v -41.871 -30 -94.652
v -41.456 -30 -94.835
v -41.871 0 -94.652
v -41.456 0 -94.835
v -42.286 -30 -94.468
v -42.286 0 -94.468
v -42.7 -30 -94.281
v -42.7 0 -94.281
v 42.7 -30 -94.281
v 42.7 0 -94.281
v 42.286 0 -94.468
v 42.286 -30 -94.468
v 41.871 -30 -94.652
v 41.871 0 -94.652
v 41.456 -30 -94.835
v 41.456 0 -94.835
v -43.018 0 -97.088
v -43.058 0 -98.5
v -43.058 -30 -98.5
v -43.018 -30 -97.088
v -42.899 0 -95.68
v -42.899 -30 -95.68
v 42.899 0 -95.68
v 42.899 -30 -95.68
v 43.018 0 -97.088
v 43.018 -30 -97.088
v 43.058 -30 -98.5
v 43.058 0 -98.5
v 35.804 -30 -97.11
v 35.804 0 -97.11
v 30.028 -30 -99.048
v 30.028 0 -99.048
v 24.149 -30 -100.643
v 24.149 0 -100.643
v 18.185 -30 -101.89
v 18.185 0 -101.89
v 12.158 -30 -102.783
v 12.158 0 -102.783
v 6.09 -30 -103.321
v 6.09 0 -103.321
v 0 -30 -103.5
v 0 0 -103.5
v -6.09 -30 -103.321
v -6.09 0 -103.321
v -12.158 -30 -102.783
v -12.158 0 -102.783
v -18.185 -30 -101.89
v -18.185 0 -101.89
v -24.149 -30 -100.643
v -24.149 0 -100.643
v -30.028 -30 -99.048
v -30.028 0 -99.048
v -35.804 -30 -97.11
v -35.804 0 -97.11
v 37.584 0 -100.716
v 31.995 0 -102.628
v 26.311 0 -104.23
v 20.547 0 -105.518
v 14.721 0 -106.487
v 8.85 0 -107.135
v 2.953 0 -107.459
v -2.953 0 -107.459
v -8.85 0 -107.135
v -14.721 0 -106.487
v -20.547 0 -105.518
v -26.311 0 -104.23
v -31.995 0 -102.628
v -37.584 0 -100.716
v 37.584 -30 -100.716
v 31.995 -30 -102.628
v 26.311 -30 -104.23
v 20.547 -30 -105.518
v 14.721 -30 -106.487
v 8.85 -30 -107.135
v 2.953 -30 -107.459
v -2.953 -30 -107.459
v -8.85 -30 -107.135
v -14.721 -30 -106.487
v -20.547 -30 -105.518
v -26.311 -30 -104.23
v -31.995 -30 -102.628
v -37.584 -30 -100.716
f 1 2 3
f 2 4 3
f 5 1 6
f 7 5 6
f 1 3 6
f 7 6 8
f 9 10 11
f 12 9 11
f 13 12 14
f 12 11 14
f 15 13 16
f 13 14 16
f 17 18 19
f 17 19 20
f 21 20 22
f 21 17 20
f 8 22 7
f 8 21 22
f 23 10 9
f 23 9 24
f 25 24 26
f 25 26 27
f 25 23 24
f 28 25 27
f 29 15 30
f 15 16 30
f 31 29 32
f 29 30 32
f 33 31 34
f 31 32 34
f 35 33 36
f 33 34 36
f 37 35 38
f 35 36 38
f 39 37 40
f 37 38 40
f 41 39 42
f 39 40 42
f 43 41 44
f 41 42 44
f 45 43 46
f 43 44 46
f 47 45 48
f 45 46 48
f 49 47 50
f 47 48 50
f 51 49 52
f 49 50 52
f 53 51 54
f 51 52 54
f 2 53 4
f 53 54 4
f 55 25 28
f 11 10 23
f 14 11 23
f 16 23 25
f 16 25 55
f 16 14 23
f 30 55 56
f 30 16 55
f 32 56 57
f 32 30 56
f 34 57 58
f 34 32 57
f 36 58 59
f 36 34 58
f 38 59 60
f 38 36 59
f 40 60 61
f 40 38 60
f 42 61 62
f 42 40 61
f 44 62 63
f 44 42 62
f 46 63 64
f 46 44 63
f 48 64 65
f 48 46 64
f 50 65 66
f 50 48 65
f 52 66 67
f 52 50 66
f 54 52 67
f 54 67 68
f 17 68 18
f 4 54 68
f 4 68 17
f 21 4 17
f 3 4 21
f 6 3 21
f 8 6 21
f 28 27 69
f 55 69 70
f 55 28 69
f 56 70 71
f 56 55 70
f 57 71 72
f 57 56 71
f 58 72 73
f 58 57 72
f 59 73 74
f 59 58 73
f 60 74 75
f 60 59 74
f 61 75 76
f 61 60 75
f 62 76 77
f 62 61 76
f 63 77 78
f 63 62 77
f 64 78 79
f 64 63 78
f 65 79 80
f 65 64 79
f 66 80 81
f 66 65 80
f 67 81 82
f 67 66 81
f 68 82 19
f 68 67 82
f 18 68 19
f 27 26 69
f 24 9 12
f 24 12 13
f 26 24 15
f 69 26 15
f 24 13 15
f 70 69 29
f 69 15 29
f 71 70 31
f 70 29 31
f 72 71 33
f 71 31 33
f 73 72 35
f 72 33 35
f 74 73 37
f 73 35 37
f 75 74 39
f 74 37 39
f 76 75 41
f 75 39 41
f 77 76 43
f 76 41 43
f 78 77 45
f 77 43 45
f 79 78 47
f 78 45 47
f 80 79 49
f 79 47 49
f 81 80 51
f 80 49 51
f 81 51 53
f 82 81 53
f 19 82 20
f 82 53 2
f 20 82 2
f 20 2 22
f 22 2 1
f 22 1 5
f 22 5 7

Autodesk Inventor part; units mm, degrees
ref_plane "YZ Plane" through (0, 0, 0) normal (1, 0, 0) x (0, 1, 0)
ref_plane "XZ Plane" through (0, 0, 0) normal (0, 1, 0) x (-1, 0, 0)
sketch "Sketch1" plane through (0, 0, 0) normal (0, 1, 0) x (-1, 0, 0)
  circle A0 centre (0, 0) radius 110 construction
  arc A1 (43.0581, -98.5) -> (-43.0581, -98.5) centre (0, 0) ccw
  line L0 (0, -107.5) -> (0, -98.5) construction
  line L1 (0, -98.5) -> (0, -73.5) construction
  line L2 (0, -98.5) -> (-43.0581, -98.5) construction
  line L3 (0, -98.5) -> (43.0581, -98.5) construction
  line L4 (43.0581, -98.5) -> (-43.0581, -98.5) construction
  line L5 (-18.0581, -73.5) -> (18.0581, -73.5)
  arc A2 (43.0581, -98.5) -> (18.0581, -73.5) centre (18.0581, -98.5) ccw
  arc A3 (-18.0581, -73.5) -> (-43.0581, -98.5) centre (-18.0581, -98.5) ccw
  line L6 (0, 107.5) -> (0, 97.5) construction
  line L7 (0, 97.5) -> (-22.5, 97.5) construction
  line L8 (-22.5, 97.5) -> (-22.5, 82.5) construction
  line L9 (22.5, 82.5) -> (22.5, 97.5) construction
  line L10 (22.5, 90) -> (-22.5, 90) construction
  line L11 (15, 97.5) -> (-15, 97.5)
  line L12 (-15, 82.5) -> (15, 82.5)
  arc A4 (15, 82.5) -> (15, 97.5) centre (15, 90) ccw
  arc A5 (-15, 97.5) -> (-15, 82.5) centre (-15, 90) ccw
  line L13 (22.5, 82.5) -> (17.5, 82.5) construction
  line L14 (17.5, 82.5) -> (17.5, 77.5) construction
  circle A6 centre (17.5, 77.5) radius 1.6
  circle A7 centre (-17.5, 77.5) radius 1.6
  line L15 (-58.336309, 79.549513) -> (-79.549513, 58.336309)
  arc A8 (-47.729708, 68.942911) -> (-58.336309, 79.549513) centre (-53.033009, 74.246212) ccw
  arc A9 (-79.549513, 58.336309) -> (-68.942911, 47.729708) centre (-74.246212, 53.033009) ccw
  line L16 (-68.942911, 47.729708) -> (-47.729708, 68.942911)
  circle A10 centre (-67.175144, 42.426407) radius 1.6
  circle A11 centre (-42.426407, 67.175144) radius 1.6
  line L17 (-97.5, 15) -> (-97.5, -15)
  arc A12 (-82.5, 15) -> (-97.5, 15) centre (-90, 15) ccw
  arc A13 (-97.5, -15) -> (-82.5, -15) centre (-90, -15) ccw
  line L18 (-82.5, -15) -> (-82.5, 15)
  circle A14 centre (-77.5, -17.5) radius 1.6
  circle A15 centre (-77.5, 17.5) radius 1.6
  line L19 (-79.549513, -58.336309) -> (-58.336309, -79.549513)
  arc A16 (-68.942911, -47.729708) -> (-79.549513, -58.336309) centre (-74.246212, -53.033009) ccw
  arc A17 (-58.336309, -79.549513) -> (-47.729708, -68.942911) centre (-53.033009, -74.246212) ccw
  line L20 (-47.729708, -68.942911) -> (-68.942911, -47.729708)
  circle A18 centre (-42.426407, -67.175144) radius 1.6
  circle A19 centre (-67.175144, -42.426407) radius 1.6
  line L21 (-15, -97.5) -> (15, -97.5)
  arc A20 (-15, -82.5) -> (-15, -97.5) centre (-15, -90) ccw
  arc A21 (15, -97.5) -> (15, -82.5) centre (15, -90) ccw
  line L22 (15, -82.5) -> (-15, -82.5)
  circle A22 centre (17.5, -77.5) radius 1.6
  circle A23 centre (-17.5, -77.5) radius 1.6
  line L23 (58.336309, -79.549513) -> (79.549513, -58.336309)
  arc A24 (47.729708, -68.942911) -> (58.336309, -79.549513) centre (53.033009, -74.246212) ccw
  arc A25 (79.549513, -58.336309) -> (68.942911, -47.729708) centre (74.246212, -53.033009) ccw
  line L24 (68.942911, -47.729708) -> (47.729708, -68.942911)
  circle A26 centre (67.175144, -42.426407) radius 1.6
  circle A27 centre (42.426407, -67.175144) radius 1.6
  line L25 (97.5, -15) -> (97.5, 15)
  arc A28 (82.5, -15) -> (97.5, -15) centre (90, -15) ccw
  arc A29 (97.5, 15) -> (82.5, 15) centre (90, 15) ccw
  line L26 (82.5, 15) -> (82.5, -15)
  circle A30 centre (77.5, 17.5) radius 1.6
  circle A31 centre (77.5, -17.5) radius 1.6
  line L27 (79.549513, 58.336309) -> (58.336309, 79.549513)
  arc A32 (68.942911, 47.729708) -> (79.549513, 58.336309) centre (74.246212, 53.033009) ccw
  arc A33 (58.336309, 79.549513) -> (47.729708, 68.942911) centre (53.033009, 74.246212) ccw
  line L28 (47.729708, 68.942911) -> (68.942911, 47.729708)
  circle A34 centre (42.426407, 67.175144) radius 1.6
  circle A35 centre (67.175144, 42.426407) radius 1.6
  line L29 (58.336309, -58.336309) -> (51.265242, -51.265242) construction
  line L30 (40.65864, -61.871843) -> (61.871843, -40.65864)
  arc A36 (40.65864, -61.871843) -> (44.52672, -89.539774) centre (53.033009, -74.246212) ccw
  arc A37 (89.539774, -44.52672) -> (61.871843, -40.65864) centre (74.246212, -53.033009) ccw
  line L31 (0, -73.5) -> (0, -66.5) construction
  arc A38 (44.52672, 89.539774) -> (40.65864, 61.871843) centre (53.033009, 74.246212) ccw
  line L32 (61.871843, 40.65864) -> (40.65864, 61.871843)
  arc A39 (61.871843, 40.65864) -> (89.539774, 44.52672) centre (74.246212, 53.033009) ccw
  arc A40 (-89.539774, 44.52672) -> (-61.871843, 40.65864) centre (-74.246212, 53.033009) ccw
  line L33 (-40.65864, 61.871843) -> (-61.871843, 40.65864)
  arc A41 (-40.65864, 61.871843) -> (-44.52672, 89.539774) centre (-53.033009, 74.246212) ccw
  arc A42 (-44.52672, -89.539774) -> (-40.65864, -61.871843) centre (-53.033009, -74.246212) ccw
  line L34 (-61.871843, -40.65864) -> (-40.65864, -61.871843)
  arc A43 (-61.871843, -40.65864) -> (-89.539774, -44.52672) centre (-74.246212, -53.033009) ccw
  arc A44 (89.539774, -44.52672) -> (89.539774, 44.52672) centre (0, 0) ccw
  arc A45 (44.52672, 89.539774) -> (-44.52672, 89.539774) centre (0, 0) ccw
  arc A46 (-89.539774, 44.52672) -> (-89.539774, -44.52672) centre (0, 0) ccw
  line L35 (43.0581, -98.5) -> (48.0581, -98.5) construction
  line L36 (48.0581, -98.5) -> (48.0581, -88.5) construction
  circle A47 centre (48.0581, -88.5) radius 1.6
  circle A48 centre (-48.0581, -88.5) radius 1.6
  line L37 (18.0581, -66.5) -> (-18.0581, -66.5)
  arc A49 (17.5, -66.5) -> (43.0581, -59.472383) centre (19.514525, -23.837671) ccw
  arc A50 (-44.52672, -58.003763) -> (-18.0581, -66.5) centre (-19.508856, -25.542168) ccw
  arc A51 (-48.0581, -88.5) -> (-42.426407, -67.175144) centre (-60.43967, -73.824078) ccw construction
  arc A52 (-48.0581, -88.5) -> (-42.426407, -67.175144) centre (-60.43967, -73.824078) ccw construction
  arc A53 (-44.936716, -92.199789) -> (-37.885276, -65.498953) centre (-60.43967, -73.824078) ccw
  arc A54 (-51.179485, -84.800211) -> (-46.967537, -68.851335) centre (-60.43967, -73.824078) ccw
  arc A55 (-51.179485, -84.800211) -> (-44.936716, -92.199789) centre (-48.0581, -88.5) ccw
  arc A56 (-37.885276, -65.498953) -> (-46.967537, -68.851335) centre (-42.426407, -67.175144) ccw
  line L38 (42.426407, 67.175144) -> (67.175144, 42.426407) construction
  line L39 (45.961941, 70.710678) -> (70.710678, 45.961941)
  line L40 (63.63961, 38.890873) -> (38.890873, 63.63961)
  arc A57 (45.961941, 70.710678) -> (38.890873, 63.63961) centre (42.426407, 67.175144) ccw
  arc A58 (63.63961, 38.890873) -> (70.710678, 45.961941) centre (67.175144, 42.426407) ccw
  line L41 (-42.426407, 67.175144) -> (-67.175144, 42.426407) construction
  line L42 (-45.961941, 70.710678) -> (-70.710678, 45.961941)
  line L43 (-63.63961, 38.890873) -> (-38.890873, 63.63961)
  arc A59 (-38.890873, 63.63961) -> (-45.961941, 70.710678) centre (-42.426407, 67.175144) ccw
  arc A60 (-70.710678, 45.961941) -> (-63.63961, 38.890873) centre (-67.175144, 42.426407) ccw
  line L44 (-42.426407, 67.175144) -> (42.426407, 67.175144) construction
  line L45 (-42.426407, 62.175144) -> (42.426407, 62.175144)
  line L46 (42.426407, 72.175144) -> (-42.426407, 72.175144)
  arc A61 (-42.426407, 72.175144) -> (-42.426407, 62.175144) centre (-42.426407, 67.175144) ccw
  arc A62 (42.426407, 62.175144) -> (42.426407, 72.175144) centre (42.426407, 67.175144) ccw
  line L47 (37.025198, 67.175144) -> (33.025198, 67.175144) construction
  line L48 (33.025198, 67.175144) -> (32.025198, 67.175144) construction
  line L49 (31.025198, 70.425144) -> (31.025198, 63.925144)
  line L50 (31.025198, 63.925144) -> (33.025198, 63.925144)
  line L51 (33.025198, 63.925144) -> (33.025198, 70.425144)
  line L52 (33.025198, 70.425144) -> (31.025198, 70.425144)
  line L53 (31.025198, 70.425144) -> (33.025198, 63.925144) construction
  line L54 (31.025198, 63.925144) -> (33.025198, 70.425144) construction
  line L55 (0, 67.175144) -> (0, 56.50884) construction
  line L56 (-31.025198, 70.425144) -> (-31.025198, 63.925144)
  line L57 (-31.025198, 63.925144) -> (-33.025198, 63.925144)
  line L58 (-33.025198, 63.925144) -> (-33.025198, 70.425144)
  line L59 (-33.025198, 70.425144) -> (-31.025198, 70.425144)
  arc A63 (-43.0581, -98.5) -> (43.0581, -98.5) centre (0, 0) ccw
  line L60 (0, -107.5) -> (0, -103.5)
  arc A64 (-41.455938, -94.834884) -> (41.455938, -94.834884) centre (0, 0) ccw
  arc A65 (41.455938, -94.834884) -> (42.699608, -94.281459) centre (0, 0) ccw
  arc A66 (-42.699608, -94.281459) -> (-41.455938, -94.834884) centre (0.000004, 0.000008) ccw
  point P0 (0, 90)
  point P1 (-45.961941, 70.710678)
  point P2 (-82.5, 17.5)
  point P3 (-70.710678, -45.961941)
  point P4 (-17.5, -82.5)
  point P5 (45.961941, -70.710678)
  point P6 (82.5, -17.5)
  point P7 (70.710678, 45.961941)
  point P8 (35.715922, -76.769806)
  point P9 (-37.90233, -65.453455)
  point P10 (-39.097126, -63.661261)
  point P11 (-46.422064, -70.704261)
  point P12 (-46.867306, -78.516354)
  point P13 (0, -44.52672)
  point P14 (0, 35.701561)
  point P15 (54.800776, 54.800776)
  point P16 (-54.800776, 54.800776)
  point P17 (40.355339, 62.175144)
  point P18 (40.65864, 61.871843)
  point P19 (-47.729708, 68.942911)
  point P20 (-68.942911, 47.729708)
  point P21 (-61.871843, 40.65864)
  point P22 (-40.355339, 62.175144)
  dimension "d0" = 220
  dimension "d1" = 215
  dimension "d2" = 9
  dimension "d3" = 25
  dimension "d4" = 10
  dimension "d5" = 22.5
  dimension "d6" = 15
  dimension "d7" = 45
  dimension "d8" = 5
  dimension "d9" = 5
  dimension "d10" = 3.2
  dimension "d15" = 86.1162
  dimension "d16" = 45
  dimension "d19" = 360
  dimension "d22" = 10
  dimension "d23" = 7
  dimension "d26" = 360
  dimension "d33" = 5
  dimension "d34" = 10
  dimension "d35" = 3.2
  dimension "d68" = 4
  dimension "d69" = 1
  dimension "d70" = 6.5
  dimension "d71" = 2
  dimension "d123" = 4
ref_plane "Work Plane4" through (0, 0, -44.52672) normal (1, 0, 0) x (0, 0.9903099, -0.1388753)
extrude "Extrusion13" add sketch "Sketch1" against normal blind 30 contours A63 L60 A64 A65 A2 | A3 A66 A64 L60 A63
properties part number "MettalringUnten_v3"
